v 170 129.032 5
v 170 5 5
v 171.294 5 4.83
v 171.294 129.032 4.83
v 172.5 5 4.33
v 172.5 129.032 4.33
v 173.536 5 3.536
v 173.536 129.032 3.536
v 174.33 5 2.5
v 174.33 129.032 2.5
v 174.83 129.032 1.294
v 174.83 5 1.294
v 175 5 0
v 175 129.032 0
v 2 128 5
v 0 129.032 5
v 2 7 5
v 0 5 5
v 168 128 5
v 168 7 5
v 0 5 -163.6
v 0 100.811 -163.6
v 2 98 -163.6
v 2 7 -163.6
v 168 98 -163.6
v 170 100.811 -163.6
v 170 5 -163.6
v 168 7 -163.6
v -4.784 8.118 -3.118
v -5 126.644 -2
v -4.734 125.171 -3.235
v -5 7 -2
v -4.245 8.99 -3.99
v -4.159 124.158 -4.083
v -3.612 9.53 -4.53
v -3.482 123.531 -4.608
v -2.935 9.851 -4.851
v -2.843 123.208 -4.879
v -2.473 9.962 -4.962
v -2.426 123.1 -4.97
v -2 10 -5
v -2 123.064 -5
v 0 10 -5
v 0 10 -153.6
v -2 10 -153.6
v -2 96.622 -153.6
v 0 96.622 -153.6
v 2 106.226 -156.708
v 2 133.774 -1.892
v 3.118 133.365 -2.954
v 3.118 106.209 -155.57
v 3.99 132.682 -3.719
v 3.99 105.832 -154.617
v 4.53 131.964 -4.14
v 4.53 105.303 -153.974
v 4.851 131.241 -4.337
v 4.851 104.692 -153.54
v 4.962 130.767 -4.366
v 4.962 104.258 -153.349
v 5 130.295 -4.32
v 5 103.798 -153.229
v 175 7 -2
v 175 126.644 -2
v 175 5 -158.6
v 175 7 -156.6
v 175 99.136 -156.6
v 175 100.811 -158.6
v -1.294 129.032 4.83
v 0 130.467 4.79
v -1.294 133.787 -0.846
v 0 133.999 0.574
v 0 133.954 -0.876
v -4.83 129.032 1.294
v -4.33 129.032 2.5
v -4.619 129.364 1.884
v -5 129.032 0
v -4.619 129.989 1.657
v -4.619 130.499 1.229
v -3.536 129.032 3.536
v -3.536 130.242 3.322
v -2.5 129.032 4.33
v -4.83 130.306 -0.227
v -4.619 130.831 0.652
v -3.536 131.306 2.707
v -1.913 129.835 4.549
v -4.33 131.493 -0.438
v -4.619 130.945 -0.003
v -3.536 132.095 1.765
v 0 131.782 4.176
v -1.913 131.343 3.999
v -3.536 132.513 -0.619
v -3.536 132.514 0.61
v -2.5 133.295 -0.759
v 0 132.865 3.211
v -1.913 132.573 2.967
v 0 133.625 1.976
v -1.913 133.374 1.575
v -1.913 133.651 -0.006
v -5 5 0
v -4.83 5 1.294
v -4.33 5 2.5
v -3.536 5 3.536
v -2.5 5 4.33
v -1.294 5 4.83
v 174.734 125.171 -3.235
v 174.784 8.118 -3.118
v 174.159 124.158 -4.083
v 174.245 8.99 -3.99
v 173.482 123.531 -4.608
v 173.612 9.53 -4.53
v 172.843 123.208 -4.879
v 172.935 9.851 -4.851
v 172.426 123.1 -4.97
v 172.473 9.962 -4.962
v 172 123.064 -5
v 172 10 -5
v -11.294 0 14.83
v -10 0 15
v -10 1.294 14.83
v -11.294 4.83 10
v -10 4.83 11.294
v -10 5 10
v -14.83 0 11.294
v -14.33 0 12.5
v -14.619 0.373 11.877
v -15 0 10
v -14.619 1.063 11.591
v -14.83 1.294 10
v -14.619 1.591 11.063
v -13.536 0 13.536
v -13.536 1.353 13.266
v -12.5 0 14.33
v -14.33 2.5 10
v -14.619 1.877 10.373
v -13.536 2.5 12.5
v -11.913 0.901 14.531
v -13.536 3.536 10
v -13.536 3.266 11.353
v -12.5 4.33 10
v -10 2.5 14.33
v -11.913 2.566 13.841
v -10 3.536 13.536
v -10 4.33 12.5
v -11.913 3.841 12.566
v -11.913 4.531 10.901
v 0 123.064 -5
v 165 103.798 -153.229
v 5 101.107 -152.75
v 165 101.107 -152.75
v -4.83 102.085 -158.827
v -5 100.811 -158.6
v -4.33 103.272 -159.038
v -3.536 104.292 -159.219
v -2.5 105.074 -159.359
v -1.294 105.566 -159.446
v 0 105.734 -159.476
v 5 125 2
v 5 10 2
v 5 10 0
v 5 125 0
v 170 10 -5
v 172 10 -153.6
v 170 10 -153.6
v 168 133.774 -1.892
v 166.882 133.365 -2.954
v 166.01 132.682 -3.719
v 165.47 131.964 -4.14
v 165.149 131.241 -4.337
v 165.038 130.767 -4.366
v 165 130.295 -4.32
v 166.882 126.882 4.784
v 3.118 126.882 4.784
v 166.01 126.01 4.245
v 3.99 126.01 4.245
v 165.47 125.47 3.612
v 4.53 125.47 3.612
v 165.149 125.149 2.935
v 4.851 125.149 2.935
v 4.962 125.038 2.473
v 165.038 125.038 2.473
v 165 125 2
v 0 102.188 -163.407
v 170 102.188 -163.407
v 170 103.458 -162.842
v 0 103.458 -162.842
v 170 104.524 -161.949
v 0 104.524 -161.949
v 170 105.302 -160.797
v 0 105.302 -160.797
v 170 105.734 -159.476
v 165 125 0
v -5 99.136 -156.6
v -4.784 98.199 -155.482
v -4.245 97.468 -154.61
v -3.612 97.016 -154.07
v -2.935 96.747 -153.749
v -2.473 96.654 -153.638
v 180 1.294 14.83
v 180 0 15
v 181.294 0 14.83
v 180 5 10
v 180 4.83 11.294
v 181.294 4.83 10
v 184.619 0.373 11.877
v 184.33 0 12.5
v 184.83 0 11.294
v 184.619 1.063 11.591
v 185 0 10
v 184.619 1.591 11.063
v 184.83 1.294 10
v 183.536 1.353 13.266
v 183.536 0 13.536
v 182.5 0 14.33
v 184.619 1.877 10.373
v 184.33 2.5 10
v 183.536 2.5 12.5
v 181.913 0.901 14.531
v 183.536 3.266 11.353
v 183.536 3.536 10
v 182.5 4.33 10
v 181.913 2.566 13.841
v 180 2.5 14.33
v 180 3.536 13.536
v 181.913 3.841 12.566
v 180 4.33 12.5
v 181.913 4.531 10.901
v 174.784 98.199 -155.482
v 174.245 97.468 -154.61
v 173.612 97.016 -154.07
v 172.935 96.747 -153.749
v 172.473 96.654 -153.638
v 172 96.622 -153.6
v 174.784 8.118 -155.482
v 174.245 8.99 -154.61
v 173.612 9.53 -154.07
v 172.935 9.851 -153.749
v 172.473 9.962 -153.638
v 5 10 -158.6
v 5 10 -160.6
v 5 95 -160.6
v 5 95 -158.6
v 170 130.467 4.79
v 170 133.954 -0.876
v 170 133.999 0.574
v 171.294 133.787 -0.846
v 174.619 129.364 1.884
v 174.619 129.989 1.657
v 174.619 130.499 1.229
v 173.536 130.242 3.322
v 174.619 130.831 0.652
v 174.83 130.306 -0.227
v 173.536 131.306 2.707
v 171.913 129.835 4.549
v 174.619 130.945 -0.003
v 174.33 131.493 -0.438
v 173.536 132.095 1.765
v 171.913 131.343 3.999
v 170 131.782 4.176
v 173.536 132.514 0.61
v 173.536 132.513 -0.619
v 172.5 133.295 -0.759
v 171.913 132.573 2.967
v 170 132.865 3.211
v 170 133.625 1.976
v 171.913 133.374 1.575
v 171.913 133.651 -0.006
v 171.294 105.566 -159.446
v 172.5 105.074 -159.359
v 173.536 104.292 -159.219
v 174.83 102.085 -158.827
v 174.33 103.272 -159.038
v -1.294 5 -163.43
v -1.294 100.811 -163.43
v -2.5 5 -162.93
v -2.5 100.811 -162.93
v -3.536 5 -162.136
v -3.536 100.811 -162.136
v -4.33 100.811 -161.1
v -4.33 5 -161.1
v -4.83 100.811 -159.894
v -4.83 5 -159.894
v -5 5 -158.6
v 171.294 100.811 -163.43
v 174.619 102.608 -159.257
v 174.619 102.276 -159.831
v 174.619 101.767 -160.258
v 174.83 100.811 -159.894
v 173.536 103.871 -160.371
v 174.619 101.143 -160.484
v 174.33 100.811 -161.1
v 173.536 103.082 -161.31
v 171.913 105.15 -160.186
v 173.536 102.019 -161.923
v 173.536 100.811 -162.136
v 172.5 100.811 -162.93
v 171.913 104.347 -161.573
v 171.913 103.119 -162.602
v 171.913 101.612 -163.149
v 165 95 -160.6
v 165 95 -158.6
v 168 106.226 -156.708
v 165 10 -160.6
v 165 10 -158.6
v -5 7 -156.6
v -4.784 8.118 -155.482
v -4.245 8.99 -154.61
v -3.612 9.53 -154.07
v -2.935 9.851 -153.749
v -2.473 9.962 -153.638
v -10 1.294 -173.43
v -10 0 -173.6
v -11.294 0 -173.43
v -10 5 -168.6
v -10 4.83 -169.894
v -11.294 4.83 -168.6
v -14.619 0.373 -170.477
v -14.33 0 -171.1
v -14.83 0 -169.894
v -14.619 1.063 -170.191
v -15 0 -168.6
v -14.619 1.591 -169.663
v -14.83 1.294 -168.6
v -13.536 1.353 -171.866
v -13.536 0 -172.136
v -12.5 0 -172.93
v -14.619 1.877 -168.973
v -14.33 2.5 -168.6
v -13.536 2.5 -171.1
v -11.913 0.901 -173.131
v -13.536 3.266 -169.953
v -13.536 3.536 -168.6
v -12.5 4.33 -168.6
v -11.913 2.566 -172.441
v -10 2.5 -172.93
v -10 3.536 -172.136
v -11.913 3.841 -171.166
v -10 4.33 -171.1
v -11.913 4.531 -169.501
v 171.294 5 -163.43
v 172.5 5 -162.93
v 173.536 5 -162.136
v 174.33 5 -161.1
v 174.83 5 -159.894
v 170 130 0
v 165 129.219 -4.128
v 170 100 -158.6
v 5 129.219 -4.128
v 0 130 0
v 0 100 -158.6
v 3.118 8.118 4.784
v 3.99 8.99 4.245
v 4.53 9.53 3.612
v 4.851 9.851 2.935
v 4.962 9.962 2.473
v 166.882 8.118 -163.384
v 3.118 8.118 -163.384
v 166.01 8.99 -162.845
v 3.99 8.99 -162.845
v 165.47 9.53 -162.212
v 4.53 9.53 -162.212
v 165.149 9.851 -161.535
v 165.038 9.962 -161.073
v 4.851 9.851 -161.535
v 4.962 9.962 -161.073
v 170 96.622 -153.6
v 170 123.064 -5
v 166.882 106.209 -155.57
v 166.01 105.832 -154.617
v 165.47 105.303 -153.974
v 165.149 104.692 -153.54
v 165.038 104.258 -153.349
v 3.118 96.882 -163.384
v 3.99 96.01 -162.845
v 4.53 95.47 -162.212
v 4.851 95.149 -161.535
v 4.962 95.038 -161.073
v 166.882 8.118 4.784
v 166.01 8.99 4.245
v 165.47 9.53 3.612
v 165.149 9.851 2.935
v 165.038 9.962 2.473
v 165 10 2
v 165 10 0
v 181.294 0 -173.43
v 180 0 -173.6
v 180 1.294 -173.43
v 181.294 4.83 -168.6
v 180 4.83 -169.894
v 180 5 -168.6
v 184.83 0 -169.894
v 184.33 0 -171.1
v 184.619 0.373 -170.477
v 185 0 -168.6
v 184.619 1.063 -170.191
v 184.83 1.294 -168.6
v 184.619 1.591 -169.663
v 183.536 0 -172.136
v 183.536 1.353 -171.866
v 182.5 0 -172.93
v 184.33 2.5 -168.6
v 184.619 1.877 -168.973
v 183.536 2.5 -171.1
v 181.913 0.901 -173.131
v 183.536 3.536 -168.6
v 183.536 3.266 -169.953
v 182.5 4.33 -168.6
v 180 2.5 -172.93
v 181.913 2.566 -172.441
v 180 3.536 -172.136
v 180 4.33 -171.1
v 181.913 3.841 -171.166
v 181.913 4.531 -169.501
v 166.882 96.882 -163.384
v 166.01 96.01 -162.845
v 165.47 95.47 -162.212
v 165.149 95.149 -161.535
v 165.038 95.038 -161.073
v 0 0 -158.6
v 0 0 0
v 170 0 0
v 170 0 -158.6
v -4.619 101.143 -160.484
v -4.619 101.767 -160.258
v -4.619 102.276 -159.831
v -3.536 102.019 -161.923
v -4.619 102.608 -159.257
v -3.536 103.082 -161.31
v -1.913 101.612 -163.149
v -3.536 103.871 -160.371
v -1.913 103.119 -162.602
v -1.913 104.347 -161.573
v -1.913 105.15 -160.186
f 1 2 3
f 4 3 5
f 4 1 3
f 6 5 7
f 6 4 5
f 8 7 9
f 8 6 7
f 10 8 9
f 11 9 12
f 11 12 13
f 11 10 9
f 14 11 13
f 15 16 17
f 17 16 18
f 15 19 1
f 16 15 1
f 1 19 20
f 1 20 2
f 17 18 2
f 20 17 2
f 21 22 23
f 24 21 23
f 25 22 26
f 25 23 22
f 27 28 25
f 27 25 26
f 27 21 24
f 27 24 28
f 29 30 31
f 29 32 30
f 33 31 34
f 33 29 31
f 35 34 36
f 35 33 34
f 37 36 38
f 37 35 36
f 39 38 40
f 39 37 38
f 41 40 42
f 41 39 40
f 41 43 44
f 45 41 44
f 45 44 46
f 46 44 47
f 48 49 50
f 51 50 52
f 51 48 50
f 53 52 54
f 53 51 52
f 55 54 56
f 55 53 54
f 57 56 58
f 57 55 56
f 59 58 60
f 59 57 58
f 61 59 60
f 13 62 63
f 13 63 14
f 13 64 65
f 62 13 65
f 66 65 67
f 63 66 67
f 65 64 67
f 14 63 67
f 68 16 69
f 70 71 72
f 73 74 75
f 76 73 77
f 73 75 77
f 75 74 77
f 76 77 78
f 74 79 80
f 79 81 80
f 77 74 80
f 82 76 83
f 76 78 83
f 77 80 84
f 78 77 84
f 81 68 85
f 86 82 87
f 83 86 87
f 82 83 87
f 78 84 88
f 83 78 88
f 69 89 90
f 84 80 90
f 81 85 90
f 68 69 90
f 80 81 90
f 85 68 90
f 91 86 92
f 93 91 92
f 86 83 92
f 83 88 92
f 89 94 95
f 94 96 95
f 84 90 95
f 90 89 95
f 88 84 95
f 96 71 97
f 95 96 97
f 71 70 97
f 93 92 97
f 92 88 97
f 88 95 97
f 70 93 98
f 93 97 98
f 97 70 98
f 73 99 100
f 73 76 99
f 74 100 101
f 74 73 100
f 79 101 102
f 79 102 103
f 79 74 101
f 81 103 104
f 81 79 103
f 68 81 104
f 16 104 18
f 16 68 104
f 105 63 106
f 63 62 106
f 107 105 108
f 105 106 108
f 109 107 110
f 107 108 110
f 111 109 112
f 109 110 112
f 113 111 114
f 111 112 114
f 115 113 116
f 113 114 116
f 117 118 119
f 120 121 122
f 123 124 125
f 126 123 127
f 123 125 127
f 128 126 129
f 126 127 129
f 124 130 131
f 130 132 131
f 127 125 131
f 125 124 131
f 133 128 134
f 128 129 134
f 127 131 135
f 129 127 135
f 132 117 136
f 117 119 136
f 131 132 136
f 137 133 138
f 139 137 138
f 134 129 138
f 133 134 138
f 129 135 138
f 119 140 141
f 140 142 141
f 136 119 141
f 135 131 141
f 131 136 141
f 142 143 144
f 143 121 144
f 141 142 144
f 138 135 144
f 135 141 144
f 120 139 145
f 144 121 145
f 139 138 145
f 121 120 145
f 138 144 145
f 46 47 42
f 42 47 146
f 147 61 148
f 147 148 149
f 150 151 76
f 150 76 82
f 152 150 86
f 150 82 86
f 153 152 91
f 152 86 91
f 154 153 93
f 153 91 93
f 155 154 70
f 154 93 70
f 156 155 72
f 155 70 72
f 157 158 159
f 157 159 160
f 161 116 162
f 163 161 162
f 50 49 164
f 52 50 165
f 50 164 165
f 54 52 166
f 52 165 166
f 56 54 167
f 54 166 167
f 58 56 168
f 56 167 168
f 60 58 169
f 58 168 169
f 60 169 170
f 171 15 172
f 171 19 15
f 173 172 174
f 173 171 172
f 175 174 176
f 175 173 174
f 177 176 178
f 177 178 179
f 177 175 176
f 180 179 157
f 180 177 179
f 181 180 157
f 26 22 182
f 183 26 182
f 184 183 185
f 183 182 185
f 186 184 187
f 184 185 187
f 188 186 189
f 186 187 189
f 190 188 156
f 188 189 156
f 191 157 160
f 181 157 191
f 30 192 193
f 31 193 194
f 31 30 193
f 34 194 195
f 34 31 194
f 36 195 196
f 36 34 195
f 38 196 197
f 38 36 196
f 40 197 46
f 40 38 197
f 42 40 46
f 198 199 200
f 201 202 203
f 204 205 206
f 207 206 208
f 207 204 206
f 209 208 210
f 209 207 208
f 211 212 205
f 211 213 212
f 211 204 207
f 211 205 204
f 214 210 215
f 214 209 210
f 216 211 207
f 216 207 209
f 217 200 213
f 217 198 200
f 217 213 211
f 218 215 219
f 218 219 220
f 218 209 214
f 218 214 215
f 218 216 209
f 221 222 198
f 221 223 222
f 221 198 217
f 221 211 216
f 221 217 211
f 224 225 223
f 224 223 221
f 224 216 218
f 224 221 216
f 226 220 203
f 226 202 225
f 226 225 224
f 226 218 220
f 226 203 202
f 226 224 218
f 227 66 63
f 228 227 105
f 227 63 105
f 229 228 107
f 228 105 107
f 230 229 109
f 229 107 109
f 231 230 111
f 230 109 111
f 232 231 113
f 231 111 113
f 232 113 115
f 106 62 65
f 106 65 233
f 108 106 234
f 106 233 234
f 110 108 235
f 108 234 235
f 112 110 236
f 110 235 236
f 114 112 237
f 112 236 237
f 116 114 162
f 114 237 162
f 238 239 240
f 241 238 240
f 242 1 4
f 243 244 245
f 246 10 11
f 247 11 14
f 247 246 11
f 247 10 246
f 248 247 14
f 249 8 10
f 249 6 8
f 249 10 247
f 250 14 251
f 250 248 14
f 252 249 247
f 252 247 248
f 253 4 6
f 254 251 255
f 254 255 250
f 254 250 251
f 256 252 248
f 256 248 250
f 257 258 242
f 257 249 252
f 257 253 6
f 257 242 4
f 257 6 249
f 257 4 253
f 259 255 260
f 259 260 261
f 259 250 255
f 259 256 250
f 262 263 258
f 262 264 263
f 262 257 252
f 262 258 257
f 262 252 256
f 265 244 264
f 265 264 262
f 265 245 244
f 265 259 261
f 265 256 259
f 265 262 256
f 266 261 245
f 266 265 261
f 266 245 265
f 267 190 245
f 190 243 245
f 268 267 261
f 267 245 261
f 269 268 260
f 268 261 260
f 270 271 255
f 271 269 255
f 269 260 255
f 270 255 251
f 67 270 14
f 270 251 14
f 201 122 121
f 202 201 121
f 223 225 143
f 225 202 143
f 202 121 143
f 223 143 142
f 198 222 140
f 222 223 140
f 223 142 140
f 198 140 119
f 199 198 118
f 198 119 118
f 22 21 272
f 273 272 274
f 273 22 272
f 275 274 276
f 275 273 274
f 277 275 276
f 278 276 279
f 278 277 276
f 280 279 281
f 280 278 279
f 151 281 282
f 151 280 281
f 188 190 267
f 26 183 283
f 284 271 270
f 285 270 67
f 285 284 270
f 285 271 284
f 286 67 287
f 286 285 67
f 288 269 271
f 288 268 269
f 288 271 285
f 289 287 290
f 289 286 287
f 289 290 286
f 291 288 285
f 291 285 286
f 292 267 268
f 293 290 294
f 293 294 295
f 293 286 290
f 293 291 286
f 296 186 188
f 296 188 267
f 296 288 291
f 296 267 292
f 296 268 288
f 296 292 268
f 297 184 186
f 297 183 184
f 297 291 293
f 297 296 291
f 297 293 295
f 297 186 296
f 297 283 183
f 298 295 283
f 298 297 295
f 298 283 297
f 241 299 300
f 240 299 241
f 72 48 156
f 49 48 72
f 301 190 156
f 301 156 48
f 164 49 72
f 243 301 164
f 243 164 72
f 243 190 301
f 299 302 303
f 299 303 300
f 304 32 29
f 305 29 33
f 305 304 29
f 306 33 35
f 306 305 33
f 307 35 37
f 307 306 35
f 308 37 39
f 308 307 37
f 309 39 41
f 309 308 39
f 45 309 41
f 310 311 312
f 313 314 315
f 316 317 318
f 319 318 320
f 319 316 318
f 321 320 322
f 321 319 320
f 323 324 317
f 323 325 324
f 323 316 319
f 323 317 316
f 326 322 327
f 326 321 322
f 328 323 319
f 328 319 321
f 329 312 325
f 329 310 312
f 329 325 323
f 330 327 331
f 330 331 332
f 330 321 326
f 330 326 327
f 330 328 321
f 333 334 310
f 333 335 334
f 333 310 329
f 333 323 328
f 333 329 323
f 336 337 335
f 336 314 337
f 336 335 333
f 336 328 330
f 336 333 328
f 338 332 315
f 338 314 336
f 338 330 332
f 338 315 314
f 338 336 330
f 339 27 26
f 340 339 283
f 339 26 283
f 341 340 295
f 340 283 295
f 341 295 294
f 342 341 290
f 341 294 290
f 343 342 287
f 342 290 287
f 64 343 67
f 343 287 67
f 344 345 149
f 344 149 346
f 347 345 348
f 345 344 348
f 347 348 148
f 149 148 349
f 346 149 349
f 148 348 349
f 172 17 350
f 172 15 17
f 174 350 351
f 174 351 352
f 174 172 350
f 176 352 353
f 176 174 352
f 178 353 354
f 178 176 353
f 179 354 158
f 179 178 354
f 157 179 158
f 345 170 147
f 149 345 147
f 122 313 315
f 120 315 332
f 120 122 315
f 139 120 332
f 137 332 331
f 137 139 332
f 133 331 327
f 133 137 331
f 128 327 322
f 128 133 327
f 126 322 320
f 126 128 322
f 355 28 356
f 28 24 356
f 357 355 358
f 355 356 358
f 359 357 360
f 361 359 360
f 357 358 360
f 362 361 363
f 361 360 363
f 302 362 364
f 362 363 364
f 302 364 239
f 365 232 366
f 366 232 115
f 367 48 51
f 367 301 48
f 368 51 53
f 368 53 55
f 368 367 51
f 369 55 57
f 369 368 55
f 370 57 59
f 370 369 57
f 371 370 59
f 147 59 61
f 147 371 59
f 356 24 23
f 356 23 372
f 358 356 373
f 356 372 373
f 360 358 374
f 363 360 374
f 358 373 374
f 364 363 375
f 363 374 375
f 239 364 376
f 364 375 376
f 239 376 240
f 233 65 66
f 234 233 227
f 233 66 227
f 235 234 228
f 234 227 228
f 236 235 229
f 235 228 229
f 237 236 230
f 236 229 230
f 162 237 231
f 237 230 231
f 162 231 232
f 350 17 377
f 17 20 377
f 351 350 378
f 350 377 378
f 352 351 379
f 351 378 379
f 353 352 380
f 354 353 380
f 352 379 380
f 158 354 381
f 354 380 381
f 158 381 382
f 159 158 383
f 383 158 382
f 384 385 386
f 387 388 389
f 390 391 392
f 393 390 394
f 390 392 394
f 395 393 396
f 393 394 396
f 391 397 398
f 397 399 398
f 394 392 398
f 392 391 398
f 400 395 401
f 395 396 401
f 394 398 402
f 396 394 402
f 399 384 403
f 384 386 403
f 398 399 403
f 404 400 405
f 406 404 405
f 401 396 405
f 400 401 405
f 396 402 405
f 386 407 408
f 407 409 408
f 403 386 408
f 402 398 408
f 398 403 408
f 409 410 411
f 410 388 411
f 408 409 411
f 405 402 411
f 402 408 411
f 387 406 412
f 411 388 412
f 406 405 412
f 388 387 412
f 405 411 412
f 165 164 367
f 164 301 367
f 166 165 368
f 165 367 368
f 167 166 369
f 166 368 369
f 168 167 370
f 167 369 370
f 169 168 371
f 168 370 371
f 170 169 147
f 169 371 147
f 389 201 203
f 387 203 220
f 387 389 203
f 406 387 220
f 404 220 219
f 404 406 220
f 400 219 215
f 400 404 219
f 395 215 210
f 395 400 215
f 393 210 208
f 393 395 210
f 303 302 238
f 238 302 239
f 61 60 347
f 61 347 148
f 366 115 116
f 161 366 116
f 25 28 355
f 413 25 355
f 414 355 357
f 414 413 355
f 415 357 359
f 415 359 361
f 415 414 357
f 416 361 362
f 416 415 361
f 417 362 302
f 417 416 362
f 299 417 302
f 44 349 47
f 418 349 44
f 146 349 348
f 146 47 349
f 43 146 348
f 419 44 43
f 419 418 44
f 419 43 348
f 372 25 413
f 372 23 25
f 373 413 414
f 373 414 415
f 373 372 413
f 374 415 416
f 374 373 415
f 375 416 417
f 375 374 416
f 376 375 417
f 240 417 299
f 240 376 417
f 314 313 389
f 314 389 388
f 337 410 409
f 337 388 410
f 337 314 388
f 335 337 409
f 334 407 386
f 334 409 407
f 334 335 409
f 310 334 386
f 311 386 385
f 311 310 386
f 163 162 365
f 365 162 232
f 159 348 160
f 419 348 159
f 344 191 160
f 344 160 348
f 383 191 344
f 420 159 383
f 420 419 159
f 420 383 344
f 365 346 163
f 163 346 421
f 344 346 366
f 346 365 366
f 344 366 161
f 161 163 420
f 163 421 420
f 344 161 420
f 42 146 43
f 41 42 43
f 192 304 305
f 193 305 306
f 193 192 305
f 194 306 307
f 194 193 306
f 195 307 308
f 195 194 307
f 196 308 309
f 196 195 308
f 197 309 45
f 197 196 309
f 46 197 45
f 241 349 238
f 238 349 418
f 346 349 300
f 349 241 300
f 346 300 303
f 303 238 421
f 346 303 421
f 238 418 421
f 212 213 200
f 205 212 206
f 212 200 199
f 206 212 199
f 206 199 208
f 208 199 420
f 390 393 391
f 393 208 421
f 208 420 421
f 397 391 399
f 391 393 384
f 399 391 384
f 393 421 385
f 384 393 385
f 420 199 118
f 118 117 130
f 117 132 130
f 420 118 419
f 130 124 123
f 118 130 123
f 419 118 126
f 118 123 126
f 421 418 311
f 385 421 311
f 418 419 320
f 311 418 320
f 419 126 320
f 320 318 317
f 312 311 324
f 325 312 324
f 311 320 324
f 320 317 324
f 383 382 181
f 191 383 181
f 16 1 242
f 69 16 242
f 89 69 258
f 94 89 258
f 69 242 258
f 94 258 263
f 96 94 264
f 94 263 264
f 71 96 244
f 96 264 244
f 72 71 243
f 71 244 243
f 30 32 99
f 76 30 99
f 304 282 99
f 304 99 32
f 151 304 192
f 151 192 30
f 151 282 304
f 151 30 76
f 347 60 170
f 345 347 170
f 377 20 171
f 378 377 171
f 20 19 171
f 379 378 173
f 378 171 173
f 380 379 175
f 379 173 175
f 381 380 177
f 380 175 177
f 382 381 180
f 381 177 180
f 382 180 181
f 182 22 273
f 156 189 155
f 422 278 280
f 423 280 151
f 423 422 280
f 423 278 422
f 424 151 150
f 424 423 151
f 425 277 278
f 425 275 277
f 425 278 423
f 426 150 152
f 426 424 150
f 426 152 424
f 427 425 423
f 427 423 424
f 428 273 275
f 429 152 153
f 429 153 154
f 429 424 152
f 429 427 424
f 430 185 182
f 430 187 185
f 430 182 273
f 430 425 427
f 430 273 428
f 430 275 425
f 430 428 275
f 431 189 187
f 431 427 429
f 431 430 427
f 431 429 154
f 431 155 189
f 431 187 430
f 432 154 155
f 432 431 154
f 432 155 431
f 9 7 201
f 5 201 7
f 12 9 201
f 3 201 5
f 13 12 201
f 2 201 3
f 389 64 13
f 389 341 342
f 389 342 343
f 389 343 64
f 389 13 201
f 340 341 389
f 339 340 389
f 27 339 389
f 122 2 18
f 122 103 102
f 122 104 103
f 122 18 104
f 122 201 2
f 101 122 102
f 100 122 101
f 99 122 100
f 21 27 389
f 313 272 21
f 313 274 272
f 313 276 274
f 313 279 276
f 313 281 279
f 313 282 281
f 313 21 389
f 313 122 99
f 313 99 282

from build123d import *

# Parameters (mm, degrees)
SKETCH1_W           = 180
SKETCH1_H           = 168.6
SKETCH1_W_2         = 170
SKETCH1_H_2         = 158.6
BOSS_EXTRUDE1_DEPTH = 135
SKETCH1_3_W         = 170
SKETCH1_3_H         = 158.6
SKETCH1_3_W_2       = 160
SKETCH1_3_H_2       = 148.6
BOSS_EXTRUDE2_DEPTH = 135
CUT_EXTRUDE1_DEPTH  = 180
SKETCH3_W           = 160
SKETCH3_H           = 151.248240867
CUT_EXTRUDE2_DEPTH  = 10
SKETCH4_W           = 170
SKETCH4_H           = 158.6
CUT_EXTRUDE3_DEPTH  = 100
CUT_EXTRUDE5_DEPTH  = 170
CUT_EXTRUDE6_DEPTH  = 180
SKETCH7_W           = 160
SKETCH7_H           = 115
CUT_EXTRUDE7_DEPTH  = 10
SKETCH8_W           = 160
SKETCH8_H           = 85
CUT_EXTRUDE8_DEPTH  = 10
FILLET2_R           = 3
FILLET3_R           = 3
SKETCH9_W           = 180
SKETCH9_H           = 5
BOSS_EXTRUDE3_DEPTH = 10
SKETCH10_W          = 180
SKETCH10_H          = 5
BOSS_EXTRUDE4_DEPTH = 10
SKETCH11_W          = 188.6
SKETCH11_H          = 5
BOSS_EXTRUDE5_DEPTH = 10
SKETCH12_W          = 188.6
SKETCH12_H          = 5
BOSS_EXTRUDE6_DEPTH = 10
FILLET4_R           = 5
FILLET5_R           = 5


with BuildPart() as part:
    # Sketch1 → Boss-Extrude1 (new body)
    with BuildSketch(Plane(origin=(0, 0, 0), x_dir=(1, 0, 0), z_dir=(0, 1, 0))):
        with Locations((85, 79.3)):
            Rectangle(SKETCH1_W, SKETCH1_H)
        with Locations((85, 79.3)):
            Rectangle(SKETCH1_W_2, SKETCH1_H_2, mode=Mode.SUBTRACT)
    extrude(amount=BOSS_EXTRUDE1_DEPTH)

    # Sketch1<3> → Boss-Extrude2 (add)
    # profile 1 of 2: a face of its own
    with BuildSketch(Plane(origin=(0, 0, 0), x_dir=(1, 0, 0), z_dir=(0, 1, 0))):
        with Locations((85, 79.3)):
            Rectangle(SKETCH1_3_W, SKETCH1_3_H)
        with Locations((85, 79.3)):
            Rectangle(SKETCH1_3_W_2, SKETCH1_3_H_2, mode=Mode.SUBTRACT)
    # profile 2 of 2: a face of its own
    with BuildSketch(Plane(origin=(0, 0, 0), x_dir=(1, 0, 0), z_dir=(0, 1, 0))):
        with Locations((85, 79.3)):
            Rectangle(SKETCH1_3_W_2, SKETCH1_3_H_2)
    extrude(amount=BOSS_EXTRUDE2_DEPTH)

    # Sketch2 → Cut-Extrude1 (cut)
    with BuildSketch(Plane(origin=(175, 0, 0), x_dir=(0, 0, -1), z_dir=(1, 0, 0))):
        Polygon((-5, 135), (163.6, 135), (163.6, 105), align=None)
    extrude(amount=-CUT_EXTRUDE1_DEPTH, mode=Mode.SUBTRACT)

    # Sketch3 → Cut-Extrude2 (cut)
    with BuildSketch(Plane(origin=(0, 129.994537263, -23.130700581), x_dir=(1, 0, 0), z_dir=(0, 0.9845356609009732, -0.17518428129910554))):
        with Locations((85, 57.051564154)):
            Rectangle(SKETCH3_W, SKETCH3_H)
    extrude(amount=-CUT_EXTRUDE2_DEPTH, mode=Mode.SUBTRACT)

    # Sketch4 → Cut-Extrude3 (cut)
    with BuildSketch(Plane.XZ):
        with Locations((85, -79.3)):
            Rectangle(SKETCH4_W, SKETCH4_H)
    extrude(amount=-CUT_EXTRUDE3_DEPTH, mode=Mode.SUBTRACT)

    # Sketch5 → Cut-Extrude5 (cut)
    with BuildSketch(Plane(origin=(0, 0, 0), x_dir=(0, 0, -1), z_dir=(1, 0, 0))):
        Polygon((0, 130), (158.6, 100), (0, 100), align=None)
    extrude(amount=CUT_EXTRUDE5_DEPTH, mode=Mode.SUBTRACT)

    # Sketch6 → Cut-Extrude6 (cut)
    with BuildSketch(Plane(origin=(175, 0, 0), x_dir=(0, 0, -1), z_dir=(1, 0, 0))):
        Polygon((5, 10), (153.6, 10), (153.6, 96.622287019), (5, 123.063568157), align=None)
    extrude(amount=-CUT_EXTRUDE6_DEPTH, mode=Mode.SUBTRACT)

    # Sketch7 → Cut-Extrude7 (cut)
    with BuildSketch(Plane.XY.offset(5)):
        with Locations((85, 67.5)):
            Rectangle(SKETCH7_W, SKETCH7_H)
    extrude(amount=-CUT_EXTRUDE7_DEPTH, mode=Mode.SUBTRACT)

    # Sketch8 → Cut-Extrude8 (cut)
    with BuildSketch(Plane(origin=(0, 0, -163.6), x_dir=(-1, 0, 0), z_dir=(0, 0, -1))):
        with Locations((-85, 52.5)):
            Rectangle(SKETCH8_W, SKETCH8_H)
    extrude(amount=-CUT_EXTRUDE8_DEPTH, mode=Mode.SUBTRACT)

    # Fillet2
    fillet2_edges = [part.edges().sort_by_distance(p)[0] for p in [
        (85, 106.751842813, -153.754643391),
        (165, 120, -79.3),
        (5, 120, -79.3),
        (85, 133.248157187, -4.845356609),
    ]]
    fillet(fillet2_edges, radius=FILLET2_R)

    # Fillet3
    fillet3_edges = [part.edges().sort_by_distance(p)[0] for p in [
        (-5, 10, -79.3),
        (-5, 66.531784079, -5),
        (-5, 109.842927588, -79.3),
        (-5, 53.311143509, -153.6),
        (175, 10, -79.3),
        (175, 53.311143509, -153.6),
        (175, 109.842927588, -79.3),
        (175, 66.531784079, -5),
        (165, 67.5, 5),
        (85, 10, 5),
        (85, 125, 5),
        (5, 67.5, 5),
        (85, 95, -163.6),
        (5, 52.5, -163.6),
        (165, 52.5, -163.6),
        (85, 10, -163.6),
    ]]
    fillet(fillet3_edges, radius=FILLET3_R)

    # Sketch9 → Boss-Extrude3 (add)
    with BuildSketch(Plane(origin=(0, 0, -163.6), x_dir=(-1, 0, 0), z_dir=(0, 0, -1))):
        with Locations((-85, 2.5)):
            Rectangle(SKETCH9_W, SKETCH9_H)
    extrude(amount=BOSS_EXTRUDE3_DEPTH)

    # Sketch10 → Boss-Extrude4 (add)
    with BuildSketch(Plane.XY.offset(5)):
        with Locations((85, 2.5)):
            Rectangle(SKETCH10_W, SKETCH10_H)
    extrude(amount=BOSS_EXTRUDE4_DEPTH)

    # Sketch11 → Boss-Extrude5 (add)
    with BuildSketch(Plane.ZY.offset(5)):
        with Locations((-79.3, 2.5)):
            Rectangle(SKETCH11_W, SKETCH11_H)
    extrude(amount=BOSS_EXTRUDE5_DEPTH)

    # Sketch12 → Boss-Extrude6 (add)
    with BuildSketch(Plane(origin=(175, 0, 0), x_dir=(0, 0, -1), z_dir=(1, 0, 0))):
        with Locations((79.3, 2.5)):
            Rectangle(SKETCH12_W, SKETCH12_H)
    extrude(amount=BOSS_EXTRUDE6_DEPTH)

    # Fillet4
    fillet4_edges = [part.edges().sort_by_distance(p)[0] for p in [
        (85, 135, 5),
        (175, 70, 5),
        (-5, 70, 5),
        (-5, 55, -163.6),
        (175, 55, -163.6),
        (-5, 120, -79.3),
        (85, 105, -163.6),
        (175, 120, -79.3),
    ]]
    fillet(fillet4_edges, radius=FILLET4_R)

    # Fillet5
    fillet5_edges = [part.edges().sort_by_distance(p)[0] for p in [
        (85, 5, -173.6),
        (85, 5, 15),
        (-15, 2.5, -173.6),
        (-15, 2.5, 15),
        (-15, 5, -79.3),
        (185, 2.5, 15),
        (185, 2.5, -173.6),
        (185, 5, -79.3),
    ]]
    fillet(fillet5_edges, radius=FILLET5_R - 0.0001)  # a hair under: the kernel refuses the full size


solid = part.part
